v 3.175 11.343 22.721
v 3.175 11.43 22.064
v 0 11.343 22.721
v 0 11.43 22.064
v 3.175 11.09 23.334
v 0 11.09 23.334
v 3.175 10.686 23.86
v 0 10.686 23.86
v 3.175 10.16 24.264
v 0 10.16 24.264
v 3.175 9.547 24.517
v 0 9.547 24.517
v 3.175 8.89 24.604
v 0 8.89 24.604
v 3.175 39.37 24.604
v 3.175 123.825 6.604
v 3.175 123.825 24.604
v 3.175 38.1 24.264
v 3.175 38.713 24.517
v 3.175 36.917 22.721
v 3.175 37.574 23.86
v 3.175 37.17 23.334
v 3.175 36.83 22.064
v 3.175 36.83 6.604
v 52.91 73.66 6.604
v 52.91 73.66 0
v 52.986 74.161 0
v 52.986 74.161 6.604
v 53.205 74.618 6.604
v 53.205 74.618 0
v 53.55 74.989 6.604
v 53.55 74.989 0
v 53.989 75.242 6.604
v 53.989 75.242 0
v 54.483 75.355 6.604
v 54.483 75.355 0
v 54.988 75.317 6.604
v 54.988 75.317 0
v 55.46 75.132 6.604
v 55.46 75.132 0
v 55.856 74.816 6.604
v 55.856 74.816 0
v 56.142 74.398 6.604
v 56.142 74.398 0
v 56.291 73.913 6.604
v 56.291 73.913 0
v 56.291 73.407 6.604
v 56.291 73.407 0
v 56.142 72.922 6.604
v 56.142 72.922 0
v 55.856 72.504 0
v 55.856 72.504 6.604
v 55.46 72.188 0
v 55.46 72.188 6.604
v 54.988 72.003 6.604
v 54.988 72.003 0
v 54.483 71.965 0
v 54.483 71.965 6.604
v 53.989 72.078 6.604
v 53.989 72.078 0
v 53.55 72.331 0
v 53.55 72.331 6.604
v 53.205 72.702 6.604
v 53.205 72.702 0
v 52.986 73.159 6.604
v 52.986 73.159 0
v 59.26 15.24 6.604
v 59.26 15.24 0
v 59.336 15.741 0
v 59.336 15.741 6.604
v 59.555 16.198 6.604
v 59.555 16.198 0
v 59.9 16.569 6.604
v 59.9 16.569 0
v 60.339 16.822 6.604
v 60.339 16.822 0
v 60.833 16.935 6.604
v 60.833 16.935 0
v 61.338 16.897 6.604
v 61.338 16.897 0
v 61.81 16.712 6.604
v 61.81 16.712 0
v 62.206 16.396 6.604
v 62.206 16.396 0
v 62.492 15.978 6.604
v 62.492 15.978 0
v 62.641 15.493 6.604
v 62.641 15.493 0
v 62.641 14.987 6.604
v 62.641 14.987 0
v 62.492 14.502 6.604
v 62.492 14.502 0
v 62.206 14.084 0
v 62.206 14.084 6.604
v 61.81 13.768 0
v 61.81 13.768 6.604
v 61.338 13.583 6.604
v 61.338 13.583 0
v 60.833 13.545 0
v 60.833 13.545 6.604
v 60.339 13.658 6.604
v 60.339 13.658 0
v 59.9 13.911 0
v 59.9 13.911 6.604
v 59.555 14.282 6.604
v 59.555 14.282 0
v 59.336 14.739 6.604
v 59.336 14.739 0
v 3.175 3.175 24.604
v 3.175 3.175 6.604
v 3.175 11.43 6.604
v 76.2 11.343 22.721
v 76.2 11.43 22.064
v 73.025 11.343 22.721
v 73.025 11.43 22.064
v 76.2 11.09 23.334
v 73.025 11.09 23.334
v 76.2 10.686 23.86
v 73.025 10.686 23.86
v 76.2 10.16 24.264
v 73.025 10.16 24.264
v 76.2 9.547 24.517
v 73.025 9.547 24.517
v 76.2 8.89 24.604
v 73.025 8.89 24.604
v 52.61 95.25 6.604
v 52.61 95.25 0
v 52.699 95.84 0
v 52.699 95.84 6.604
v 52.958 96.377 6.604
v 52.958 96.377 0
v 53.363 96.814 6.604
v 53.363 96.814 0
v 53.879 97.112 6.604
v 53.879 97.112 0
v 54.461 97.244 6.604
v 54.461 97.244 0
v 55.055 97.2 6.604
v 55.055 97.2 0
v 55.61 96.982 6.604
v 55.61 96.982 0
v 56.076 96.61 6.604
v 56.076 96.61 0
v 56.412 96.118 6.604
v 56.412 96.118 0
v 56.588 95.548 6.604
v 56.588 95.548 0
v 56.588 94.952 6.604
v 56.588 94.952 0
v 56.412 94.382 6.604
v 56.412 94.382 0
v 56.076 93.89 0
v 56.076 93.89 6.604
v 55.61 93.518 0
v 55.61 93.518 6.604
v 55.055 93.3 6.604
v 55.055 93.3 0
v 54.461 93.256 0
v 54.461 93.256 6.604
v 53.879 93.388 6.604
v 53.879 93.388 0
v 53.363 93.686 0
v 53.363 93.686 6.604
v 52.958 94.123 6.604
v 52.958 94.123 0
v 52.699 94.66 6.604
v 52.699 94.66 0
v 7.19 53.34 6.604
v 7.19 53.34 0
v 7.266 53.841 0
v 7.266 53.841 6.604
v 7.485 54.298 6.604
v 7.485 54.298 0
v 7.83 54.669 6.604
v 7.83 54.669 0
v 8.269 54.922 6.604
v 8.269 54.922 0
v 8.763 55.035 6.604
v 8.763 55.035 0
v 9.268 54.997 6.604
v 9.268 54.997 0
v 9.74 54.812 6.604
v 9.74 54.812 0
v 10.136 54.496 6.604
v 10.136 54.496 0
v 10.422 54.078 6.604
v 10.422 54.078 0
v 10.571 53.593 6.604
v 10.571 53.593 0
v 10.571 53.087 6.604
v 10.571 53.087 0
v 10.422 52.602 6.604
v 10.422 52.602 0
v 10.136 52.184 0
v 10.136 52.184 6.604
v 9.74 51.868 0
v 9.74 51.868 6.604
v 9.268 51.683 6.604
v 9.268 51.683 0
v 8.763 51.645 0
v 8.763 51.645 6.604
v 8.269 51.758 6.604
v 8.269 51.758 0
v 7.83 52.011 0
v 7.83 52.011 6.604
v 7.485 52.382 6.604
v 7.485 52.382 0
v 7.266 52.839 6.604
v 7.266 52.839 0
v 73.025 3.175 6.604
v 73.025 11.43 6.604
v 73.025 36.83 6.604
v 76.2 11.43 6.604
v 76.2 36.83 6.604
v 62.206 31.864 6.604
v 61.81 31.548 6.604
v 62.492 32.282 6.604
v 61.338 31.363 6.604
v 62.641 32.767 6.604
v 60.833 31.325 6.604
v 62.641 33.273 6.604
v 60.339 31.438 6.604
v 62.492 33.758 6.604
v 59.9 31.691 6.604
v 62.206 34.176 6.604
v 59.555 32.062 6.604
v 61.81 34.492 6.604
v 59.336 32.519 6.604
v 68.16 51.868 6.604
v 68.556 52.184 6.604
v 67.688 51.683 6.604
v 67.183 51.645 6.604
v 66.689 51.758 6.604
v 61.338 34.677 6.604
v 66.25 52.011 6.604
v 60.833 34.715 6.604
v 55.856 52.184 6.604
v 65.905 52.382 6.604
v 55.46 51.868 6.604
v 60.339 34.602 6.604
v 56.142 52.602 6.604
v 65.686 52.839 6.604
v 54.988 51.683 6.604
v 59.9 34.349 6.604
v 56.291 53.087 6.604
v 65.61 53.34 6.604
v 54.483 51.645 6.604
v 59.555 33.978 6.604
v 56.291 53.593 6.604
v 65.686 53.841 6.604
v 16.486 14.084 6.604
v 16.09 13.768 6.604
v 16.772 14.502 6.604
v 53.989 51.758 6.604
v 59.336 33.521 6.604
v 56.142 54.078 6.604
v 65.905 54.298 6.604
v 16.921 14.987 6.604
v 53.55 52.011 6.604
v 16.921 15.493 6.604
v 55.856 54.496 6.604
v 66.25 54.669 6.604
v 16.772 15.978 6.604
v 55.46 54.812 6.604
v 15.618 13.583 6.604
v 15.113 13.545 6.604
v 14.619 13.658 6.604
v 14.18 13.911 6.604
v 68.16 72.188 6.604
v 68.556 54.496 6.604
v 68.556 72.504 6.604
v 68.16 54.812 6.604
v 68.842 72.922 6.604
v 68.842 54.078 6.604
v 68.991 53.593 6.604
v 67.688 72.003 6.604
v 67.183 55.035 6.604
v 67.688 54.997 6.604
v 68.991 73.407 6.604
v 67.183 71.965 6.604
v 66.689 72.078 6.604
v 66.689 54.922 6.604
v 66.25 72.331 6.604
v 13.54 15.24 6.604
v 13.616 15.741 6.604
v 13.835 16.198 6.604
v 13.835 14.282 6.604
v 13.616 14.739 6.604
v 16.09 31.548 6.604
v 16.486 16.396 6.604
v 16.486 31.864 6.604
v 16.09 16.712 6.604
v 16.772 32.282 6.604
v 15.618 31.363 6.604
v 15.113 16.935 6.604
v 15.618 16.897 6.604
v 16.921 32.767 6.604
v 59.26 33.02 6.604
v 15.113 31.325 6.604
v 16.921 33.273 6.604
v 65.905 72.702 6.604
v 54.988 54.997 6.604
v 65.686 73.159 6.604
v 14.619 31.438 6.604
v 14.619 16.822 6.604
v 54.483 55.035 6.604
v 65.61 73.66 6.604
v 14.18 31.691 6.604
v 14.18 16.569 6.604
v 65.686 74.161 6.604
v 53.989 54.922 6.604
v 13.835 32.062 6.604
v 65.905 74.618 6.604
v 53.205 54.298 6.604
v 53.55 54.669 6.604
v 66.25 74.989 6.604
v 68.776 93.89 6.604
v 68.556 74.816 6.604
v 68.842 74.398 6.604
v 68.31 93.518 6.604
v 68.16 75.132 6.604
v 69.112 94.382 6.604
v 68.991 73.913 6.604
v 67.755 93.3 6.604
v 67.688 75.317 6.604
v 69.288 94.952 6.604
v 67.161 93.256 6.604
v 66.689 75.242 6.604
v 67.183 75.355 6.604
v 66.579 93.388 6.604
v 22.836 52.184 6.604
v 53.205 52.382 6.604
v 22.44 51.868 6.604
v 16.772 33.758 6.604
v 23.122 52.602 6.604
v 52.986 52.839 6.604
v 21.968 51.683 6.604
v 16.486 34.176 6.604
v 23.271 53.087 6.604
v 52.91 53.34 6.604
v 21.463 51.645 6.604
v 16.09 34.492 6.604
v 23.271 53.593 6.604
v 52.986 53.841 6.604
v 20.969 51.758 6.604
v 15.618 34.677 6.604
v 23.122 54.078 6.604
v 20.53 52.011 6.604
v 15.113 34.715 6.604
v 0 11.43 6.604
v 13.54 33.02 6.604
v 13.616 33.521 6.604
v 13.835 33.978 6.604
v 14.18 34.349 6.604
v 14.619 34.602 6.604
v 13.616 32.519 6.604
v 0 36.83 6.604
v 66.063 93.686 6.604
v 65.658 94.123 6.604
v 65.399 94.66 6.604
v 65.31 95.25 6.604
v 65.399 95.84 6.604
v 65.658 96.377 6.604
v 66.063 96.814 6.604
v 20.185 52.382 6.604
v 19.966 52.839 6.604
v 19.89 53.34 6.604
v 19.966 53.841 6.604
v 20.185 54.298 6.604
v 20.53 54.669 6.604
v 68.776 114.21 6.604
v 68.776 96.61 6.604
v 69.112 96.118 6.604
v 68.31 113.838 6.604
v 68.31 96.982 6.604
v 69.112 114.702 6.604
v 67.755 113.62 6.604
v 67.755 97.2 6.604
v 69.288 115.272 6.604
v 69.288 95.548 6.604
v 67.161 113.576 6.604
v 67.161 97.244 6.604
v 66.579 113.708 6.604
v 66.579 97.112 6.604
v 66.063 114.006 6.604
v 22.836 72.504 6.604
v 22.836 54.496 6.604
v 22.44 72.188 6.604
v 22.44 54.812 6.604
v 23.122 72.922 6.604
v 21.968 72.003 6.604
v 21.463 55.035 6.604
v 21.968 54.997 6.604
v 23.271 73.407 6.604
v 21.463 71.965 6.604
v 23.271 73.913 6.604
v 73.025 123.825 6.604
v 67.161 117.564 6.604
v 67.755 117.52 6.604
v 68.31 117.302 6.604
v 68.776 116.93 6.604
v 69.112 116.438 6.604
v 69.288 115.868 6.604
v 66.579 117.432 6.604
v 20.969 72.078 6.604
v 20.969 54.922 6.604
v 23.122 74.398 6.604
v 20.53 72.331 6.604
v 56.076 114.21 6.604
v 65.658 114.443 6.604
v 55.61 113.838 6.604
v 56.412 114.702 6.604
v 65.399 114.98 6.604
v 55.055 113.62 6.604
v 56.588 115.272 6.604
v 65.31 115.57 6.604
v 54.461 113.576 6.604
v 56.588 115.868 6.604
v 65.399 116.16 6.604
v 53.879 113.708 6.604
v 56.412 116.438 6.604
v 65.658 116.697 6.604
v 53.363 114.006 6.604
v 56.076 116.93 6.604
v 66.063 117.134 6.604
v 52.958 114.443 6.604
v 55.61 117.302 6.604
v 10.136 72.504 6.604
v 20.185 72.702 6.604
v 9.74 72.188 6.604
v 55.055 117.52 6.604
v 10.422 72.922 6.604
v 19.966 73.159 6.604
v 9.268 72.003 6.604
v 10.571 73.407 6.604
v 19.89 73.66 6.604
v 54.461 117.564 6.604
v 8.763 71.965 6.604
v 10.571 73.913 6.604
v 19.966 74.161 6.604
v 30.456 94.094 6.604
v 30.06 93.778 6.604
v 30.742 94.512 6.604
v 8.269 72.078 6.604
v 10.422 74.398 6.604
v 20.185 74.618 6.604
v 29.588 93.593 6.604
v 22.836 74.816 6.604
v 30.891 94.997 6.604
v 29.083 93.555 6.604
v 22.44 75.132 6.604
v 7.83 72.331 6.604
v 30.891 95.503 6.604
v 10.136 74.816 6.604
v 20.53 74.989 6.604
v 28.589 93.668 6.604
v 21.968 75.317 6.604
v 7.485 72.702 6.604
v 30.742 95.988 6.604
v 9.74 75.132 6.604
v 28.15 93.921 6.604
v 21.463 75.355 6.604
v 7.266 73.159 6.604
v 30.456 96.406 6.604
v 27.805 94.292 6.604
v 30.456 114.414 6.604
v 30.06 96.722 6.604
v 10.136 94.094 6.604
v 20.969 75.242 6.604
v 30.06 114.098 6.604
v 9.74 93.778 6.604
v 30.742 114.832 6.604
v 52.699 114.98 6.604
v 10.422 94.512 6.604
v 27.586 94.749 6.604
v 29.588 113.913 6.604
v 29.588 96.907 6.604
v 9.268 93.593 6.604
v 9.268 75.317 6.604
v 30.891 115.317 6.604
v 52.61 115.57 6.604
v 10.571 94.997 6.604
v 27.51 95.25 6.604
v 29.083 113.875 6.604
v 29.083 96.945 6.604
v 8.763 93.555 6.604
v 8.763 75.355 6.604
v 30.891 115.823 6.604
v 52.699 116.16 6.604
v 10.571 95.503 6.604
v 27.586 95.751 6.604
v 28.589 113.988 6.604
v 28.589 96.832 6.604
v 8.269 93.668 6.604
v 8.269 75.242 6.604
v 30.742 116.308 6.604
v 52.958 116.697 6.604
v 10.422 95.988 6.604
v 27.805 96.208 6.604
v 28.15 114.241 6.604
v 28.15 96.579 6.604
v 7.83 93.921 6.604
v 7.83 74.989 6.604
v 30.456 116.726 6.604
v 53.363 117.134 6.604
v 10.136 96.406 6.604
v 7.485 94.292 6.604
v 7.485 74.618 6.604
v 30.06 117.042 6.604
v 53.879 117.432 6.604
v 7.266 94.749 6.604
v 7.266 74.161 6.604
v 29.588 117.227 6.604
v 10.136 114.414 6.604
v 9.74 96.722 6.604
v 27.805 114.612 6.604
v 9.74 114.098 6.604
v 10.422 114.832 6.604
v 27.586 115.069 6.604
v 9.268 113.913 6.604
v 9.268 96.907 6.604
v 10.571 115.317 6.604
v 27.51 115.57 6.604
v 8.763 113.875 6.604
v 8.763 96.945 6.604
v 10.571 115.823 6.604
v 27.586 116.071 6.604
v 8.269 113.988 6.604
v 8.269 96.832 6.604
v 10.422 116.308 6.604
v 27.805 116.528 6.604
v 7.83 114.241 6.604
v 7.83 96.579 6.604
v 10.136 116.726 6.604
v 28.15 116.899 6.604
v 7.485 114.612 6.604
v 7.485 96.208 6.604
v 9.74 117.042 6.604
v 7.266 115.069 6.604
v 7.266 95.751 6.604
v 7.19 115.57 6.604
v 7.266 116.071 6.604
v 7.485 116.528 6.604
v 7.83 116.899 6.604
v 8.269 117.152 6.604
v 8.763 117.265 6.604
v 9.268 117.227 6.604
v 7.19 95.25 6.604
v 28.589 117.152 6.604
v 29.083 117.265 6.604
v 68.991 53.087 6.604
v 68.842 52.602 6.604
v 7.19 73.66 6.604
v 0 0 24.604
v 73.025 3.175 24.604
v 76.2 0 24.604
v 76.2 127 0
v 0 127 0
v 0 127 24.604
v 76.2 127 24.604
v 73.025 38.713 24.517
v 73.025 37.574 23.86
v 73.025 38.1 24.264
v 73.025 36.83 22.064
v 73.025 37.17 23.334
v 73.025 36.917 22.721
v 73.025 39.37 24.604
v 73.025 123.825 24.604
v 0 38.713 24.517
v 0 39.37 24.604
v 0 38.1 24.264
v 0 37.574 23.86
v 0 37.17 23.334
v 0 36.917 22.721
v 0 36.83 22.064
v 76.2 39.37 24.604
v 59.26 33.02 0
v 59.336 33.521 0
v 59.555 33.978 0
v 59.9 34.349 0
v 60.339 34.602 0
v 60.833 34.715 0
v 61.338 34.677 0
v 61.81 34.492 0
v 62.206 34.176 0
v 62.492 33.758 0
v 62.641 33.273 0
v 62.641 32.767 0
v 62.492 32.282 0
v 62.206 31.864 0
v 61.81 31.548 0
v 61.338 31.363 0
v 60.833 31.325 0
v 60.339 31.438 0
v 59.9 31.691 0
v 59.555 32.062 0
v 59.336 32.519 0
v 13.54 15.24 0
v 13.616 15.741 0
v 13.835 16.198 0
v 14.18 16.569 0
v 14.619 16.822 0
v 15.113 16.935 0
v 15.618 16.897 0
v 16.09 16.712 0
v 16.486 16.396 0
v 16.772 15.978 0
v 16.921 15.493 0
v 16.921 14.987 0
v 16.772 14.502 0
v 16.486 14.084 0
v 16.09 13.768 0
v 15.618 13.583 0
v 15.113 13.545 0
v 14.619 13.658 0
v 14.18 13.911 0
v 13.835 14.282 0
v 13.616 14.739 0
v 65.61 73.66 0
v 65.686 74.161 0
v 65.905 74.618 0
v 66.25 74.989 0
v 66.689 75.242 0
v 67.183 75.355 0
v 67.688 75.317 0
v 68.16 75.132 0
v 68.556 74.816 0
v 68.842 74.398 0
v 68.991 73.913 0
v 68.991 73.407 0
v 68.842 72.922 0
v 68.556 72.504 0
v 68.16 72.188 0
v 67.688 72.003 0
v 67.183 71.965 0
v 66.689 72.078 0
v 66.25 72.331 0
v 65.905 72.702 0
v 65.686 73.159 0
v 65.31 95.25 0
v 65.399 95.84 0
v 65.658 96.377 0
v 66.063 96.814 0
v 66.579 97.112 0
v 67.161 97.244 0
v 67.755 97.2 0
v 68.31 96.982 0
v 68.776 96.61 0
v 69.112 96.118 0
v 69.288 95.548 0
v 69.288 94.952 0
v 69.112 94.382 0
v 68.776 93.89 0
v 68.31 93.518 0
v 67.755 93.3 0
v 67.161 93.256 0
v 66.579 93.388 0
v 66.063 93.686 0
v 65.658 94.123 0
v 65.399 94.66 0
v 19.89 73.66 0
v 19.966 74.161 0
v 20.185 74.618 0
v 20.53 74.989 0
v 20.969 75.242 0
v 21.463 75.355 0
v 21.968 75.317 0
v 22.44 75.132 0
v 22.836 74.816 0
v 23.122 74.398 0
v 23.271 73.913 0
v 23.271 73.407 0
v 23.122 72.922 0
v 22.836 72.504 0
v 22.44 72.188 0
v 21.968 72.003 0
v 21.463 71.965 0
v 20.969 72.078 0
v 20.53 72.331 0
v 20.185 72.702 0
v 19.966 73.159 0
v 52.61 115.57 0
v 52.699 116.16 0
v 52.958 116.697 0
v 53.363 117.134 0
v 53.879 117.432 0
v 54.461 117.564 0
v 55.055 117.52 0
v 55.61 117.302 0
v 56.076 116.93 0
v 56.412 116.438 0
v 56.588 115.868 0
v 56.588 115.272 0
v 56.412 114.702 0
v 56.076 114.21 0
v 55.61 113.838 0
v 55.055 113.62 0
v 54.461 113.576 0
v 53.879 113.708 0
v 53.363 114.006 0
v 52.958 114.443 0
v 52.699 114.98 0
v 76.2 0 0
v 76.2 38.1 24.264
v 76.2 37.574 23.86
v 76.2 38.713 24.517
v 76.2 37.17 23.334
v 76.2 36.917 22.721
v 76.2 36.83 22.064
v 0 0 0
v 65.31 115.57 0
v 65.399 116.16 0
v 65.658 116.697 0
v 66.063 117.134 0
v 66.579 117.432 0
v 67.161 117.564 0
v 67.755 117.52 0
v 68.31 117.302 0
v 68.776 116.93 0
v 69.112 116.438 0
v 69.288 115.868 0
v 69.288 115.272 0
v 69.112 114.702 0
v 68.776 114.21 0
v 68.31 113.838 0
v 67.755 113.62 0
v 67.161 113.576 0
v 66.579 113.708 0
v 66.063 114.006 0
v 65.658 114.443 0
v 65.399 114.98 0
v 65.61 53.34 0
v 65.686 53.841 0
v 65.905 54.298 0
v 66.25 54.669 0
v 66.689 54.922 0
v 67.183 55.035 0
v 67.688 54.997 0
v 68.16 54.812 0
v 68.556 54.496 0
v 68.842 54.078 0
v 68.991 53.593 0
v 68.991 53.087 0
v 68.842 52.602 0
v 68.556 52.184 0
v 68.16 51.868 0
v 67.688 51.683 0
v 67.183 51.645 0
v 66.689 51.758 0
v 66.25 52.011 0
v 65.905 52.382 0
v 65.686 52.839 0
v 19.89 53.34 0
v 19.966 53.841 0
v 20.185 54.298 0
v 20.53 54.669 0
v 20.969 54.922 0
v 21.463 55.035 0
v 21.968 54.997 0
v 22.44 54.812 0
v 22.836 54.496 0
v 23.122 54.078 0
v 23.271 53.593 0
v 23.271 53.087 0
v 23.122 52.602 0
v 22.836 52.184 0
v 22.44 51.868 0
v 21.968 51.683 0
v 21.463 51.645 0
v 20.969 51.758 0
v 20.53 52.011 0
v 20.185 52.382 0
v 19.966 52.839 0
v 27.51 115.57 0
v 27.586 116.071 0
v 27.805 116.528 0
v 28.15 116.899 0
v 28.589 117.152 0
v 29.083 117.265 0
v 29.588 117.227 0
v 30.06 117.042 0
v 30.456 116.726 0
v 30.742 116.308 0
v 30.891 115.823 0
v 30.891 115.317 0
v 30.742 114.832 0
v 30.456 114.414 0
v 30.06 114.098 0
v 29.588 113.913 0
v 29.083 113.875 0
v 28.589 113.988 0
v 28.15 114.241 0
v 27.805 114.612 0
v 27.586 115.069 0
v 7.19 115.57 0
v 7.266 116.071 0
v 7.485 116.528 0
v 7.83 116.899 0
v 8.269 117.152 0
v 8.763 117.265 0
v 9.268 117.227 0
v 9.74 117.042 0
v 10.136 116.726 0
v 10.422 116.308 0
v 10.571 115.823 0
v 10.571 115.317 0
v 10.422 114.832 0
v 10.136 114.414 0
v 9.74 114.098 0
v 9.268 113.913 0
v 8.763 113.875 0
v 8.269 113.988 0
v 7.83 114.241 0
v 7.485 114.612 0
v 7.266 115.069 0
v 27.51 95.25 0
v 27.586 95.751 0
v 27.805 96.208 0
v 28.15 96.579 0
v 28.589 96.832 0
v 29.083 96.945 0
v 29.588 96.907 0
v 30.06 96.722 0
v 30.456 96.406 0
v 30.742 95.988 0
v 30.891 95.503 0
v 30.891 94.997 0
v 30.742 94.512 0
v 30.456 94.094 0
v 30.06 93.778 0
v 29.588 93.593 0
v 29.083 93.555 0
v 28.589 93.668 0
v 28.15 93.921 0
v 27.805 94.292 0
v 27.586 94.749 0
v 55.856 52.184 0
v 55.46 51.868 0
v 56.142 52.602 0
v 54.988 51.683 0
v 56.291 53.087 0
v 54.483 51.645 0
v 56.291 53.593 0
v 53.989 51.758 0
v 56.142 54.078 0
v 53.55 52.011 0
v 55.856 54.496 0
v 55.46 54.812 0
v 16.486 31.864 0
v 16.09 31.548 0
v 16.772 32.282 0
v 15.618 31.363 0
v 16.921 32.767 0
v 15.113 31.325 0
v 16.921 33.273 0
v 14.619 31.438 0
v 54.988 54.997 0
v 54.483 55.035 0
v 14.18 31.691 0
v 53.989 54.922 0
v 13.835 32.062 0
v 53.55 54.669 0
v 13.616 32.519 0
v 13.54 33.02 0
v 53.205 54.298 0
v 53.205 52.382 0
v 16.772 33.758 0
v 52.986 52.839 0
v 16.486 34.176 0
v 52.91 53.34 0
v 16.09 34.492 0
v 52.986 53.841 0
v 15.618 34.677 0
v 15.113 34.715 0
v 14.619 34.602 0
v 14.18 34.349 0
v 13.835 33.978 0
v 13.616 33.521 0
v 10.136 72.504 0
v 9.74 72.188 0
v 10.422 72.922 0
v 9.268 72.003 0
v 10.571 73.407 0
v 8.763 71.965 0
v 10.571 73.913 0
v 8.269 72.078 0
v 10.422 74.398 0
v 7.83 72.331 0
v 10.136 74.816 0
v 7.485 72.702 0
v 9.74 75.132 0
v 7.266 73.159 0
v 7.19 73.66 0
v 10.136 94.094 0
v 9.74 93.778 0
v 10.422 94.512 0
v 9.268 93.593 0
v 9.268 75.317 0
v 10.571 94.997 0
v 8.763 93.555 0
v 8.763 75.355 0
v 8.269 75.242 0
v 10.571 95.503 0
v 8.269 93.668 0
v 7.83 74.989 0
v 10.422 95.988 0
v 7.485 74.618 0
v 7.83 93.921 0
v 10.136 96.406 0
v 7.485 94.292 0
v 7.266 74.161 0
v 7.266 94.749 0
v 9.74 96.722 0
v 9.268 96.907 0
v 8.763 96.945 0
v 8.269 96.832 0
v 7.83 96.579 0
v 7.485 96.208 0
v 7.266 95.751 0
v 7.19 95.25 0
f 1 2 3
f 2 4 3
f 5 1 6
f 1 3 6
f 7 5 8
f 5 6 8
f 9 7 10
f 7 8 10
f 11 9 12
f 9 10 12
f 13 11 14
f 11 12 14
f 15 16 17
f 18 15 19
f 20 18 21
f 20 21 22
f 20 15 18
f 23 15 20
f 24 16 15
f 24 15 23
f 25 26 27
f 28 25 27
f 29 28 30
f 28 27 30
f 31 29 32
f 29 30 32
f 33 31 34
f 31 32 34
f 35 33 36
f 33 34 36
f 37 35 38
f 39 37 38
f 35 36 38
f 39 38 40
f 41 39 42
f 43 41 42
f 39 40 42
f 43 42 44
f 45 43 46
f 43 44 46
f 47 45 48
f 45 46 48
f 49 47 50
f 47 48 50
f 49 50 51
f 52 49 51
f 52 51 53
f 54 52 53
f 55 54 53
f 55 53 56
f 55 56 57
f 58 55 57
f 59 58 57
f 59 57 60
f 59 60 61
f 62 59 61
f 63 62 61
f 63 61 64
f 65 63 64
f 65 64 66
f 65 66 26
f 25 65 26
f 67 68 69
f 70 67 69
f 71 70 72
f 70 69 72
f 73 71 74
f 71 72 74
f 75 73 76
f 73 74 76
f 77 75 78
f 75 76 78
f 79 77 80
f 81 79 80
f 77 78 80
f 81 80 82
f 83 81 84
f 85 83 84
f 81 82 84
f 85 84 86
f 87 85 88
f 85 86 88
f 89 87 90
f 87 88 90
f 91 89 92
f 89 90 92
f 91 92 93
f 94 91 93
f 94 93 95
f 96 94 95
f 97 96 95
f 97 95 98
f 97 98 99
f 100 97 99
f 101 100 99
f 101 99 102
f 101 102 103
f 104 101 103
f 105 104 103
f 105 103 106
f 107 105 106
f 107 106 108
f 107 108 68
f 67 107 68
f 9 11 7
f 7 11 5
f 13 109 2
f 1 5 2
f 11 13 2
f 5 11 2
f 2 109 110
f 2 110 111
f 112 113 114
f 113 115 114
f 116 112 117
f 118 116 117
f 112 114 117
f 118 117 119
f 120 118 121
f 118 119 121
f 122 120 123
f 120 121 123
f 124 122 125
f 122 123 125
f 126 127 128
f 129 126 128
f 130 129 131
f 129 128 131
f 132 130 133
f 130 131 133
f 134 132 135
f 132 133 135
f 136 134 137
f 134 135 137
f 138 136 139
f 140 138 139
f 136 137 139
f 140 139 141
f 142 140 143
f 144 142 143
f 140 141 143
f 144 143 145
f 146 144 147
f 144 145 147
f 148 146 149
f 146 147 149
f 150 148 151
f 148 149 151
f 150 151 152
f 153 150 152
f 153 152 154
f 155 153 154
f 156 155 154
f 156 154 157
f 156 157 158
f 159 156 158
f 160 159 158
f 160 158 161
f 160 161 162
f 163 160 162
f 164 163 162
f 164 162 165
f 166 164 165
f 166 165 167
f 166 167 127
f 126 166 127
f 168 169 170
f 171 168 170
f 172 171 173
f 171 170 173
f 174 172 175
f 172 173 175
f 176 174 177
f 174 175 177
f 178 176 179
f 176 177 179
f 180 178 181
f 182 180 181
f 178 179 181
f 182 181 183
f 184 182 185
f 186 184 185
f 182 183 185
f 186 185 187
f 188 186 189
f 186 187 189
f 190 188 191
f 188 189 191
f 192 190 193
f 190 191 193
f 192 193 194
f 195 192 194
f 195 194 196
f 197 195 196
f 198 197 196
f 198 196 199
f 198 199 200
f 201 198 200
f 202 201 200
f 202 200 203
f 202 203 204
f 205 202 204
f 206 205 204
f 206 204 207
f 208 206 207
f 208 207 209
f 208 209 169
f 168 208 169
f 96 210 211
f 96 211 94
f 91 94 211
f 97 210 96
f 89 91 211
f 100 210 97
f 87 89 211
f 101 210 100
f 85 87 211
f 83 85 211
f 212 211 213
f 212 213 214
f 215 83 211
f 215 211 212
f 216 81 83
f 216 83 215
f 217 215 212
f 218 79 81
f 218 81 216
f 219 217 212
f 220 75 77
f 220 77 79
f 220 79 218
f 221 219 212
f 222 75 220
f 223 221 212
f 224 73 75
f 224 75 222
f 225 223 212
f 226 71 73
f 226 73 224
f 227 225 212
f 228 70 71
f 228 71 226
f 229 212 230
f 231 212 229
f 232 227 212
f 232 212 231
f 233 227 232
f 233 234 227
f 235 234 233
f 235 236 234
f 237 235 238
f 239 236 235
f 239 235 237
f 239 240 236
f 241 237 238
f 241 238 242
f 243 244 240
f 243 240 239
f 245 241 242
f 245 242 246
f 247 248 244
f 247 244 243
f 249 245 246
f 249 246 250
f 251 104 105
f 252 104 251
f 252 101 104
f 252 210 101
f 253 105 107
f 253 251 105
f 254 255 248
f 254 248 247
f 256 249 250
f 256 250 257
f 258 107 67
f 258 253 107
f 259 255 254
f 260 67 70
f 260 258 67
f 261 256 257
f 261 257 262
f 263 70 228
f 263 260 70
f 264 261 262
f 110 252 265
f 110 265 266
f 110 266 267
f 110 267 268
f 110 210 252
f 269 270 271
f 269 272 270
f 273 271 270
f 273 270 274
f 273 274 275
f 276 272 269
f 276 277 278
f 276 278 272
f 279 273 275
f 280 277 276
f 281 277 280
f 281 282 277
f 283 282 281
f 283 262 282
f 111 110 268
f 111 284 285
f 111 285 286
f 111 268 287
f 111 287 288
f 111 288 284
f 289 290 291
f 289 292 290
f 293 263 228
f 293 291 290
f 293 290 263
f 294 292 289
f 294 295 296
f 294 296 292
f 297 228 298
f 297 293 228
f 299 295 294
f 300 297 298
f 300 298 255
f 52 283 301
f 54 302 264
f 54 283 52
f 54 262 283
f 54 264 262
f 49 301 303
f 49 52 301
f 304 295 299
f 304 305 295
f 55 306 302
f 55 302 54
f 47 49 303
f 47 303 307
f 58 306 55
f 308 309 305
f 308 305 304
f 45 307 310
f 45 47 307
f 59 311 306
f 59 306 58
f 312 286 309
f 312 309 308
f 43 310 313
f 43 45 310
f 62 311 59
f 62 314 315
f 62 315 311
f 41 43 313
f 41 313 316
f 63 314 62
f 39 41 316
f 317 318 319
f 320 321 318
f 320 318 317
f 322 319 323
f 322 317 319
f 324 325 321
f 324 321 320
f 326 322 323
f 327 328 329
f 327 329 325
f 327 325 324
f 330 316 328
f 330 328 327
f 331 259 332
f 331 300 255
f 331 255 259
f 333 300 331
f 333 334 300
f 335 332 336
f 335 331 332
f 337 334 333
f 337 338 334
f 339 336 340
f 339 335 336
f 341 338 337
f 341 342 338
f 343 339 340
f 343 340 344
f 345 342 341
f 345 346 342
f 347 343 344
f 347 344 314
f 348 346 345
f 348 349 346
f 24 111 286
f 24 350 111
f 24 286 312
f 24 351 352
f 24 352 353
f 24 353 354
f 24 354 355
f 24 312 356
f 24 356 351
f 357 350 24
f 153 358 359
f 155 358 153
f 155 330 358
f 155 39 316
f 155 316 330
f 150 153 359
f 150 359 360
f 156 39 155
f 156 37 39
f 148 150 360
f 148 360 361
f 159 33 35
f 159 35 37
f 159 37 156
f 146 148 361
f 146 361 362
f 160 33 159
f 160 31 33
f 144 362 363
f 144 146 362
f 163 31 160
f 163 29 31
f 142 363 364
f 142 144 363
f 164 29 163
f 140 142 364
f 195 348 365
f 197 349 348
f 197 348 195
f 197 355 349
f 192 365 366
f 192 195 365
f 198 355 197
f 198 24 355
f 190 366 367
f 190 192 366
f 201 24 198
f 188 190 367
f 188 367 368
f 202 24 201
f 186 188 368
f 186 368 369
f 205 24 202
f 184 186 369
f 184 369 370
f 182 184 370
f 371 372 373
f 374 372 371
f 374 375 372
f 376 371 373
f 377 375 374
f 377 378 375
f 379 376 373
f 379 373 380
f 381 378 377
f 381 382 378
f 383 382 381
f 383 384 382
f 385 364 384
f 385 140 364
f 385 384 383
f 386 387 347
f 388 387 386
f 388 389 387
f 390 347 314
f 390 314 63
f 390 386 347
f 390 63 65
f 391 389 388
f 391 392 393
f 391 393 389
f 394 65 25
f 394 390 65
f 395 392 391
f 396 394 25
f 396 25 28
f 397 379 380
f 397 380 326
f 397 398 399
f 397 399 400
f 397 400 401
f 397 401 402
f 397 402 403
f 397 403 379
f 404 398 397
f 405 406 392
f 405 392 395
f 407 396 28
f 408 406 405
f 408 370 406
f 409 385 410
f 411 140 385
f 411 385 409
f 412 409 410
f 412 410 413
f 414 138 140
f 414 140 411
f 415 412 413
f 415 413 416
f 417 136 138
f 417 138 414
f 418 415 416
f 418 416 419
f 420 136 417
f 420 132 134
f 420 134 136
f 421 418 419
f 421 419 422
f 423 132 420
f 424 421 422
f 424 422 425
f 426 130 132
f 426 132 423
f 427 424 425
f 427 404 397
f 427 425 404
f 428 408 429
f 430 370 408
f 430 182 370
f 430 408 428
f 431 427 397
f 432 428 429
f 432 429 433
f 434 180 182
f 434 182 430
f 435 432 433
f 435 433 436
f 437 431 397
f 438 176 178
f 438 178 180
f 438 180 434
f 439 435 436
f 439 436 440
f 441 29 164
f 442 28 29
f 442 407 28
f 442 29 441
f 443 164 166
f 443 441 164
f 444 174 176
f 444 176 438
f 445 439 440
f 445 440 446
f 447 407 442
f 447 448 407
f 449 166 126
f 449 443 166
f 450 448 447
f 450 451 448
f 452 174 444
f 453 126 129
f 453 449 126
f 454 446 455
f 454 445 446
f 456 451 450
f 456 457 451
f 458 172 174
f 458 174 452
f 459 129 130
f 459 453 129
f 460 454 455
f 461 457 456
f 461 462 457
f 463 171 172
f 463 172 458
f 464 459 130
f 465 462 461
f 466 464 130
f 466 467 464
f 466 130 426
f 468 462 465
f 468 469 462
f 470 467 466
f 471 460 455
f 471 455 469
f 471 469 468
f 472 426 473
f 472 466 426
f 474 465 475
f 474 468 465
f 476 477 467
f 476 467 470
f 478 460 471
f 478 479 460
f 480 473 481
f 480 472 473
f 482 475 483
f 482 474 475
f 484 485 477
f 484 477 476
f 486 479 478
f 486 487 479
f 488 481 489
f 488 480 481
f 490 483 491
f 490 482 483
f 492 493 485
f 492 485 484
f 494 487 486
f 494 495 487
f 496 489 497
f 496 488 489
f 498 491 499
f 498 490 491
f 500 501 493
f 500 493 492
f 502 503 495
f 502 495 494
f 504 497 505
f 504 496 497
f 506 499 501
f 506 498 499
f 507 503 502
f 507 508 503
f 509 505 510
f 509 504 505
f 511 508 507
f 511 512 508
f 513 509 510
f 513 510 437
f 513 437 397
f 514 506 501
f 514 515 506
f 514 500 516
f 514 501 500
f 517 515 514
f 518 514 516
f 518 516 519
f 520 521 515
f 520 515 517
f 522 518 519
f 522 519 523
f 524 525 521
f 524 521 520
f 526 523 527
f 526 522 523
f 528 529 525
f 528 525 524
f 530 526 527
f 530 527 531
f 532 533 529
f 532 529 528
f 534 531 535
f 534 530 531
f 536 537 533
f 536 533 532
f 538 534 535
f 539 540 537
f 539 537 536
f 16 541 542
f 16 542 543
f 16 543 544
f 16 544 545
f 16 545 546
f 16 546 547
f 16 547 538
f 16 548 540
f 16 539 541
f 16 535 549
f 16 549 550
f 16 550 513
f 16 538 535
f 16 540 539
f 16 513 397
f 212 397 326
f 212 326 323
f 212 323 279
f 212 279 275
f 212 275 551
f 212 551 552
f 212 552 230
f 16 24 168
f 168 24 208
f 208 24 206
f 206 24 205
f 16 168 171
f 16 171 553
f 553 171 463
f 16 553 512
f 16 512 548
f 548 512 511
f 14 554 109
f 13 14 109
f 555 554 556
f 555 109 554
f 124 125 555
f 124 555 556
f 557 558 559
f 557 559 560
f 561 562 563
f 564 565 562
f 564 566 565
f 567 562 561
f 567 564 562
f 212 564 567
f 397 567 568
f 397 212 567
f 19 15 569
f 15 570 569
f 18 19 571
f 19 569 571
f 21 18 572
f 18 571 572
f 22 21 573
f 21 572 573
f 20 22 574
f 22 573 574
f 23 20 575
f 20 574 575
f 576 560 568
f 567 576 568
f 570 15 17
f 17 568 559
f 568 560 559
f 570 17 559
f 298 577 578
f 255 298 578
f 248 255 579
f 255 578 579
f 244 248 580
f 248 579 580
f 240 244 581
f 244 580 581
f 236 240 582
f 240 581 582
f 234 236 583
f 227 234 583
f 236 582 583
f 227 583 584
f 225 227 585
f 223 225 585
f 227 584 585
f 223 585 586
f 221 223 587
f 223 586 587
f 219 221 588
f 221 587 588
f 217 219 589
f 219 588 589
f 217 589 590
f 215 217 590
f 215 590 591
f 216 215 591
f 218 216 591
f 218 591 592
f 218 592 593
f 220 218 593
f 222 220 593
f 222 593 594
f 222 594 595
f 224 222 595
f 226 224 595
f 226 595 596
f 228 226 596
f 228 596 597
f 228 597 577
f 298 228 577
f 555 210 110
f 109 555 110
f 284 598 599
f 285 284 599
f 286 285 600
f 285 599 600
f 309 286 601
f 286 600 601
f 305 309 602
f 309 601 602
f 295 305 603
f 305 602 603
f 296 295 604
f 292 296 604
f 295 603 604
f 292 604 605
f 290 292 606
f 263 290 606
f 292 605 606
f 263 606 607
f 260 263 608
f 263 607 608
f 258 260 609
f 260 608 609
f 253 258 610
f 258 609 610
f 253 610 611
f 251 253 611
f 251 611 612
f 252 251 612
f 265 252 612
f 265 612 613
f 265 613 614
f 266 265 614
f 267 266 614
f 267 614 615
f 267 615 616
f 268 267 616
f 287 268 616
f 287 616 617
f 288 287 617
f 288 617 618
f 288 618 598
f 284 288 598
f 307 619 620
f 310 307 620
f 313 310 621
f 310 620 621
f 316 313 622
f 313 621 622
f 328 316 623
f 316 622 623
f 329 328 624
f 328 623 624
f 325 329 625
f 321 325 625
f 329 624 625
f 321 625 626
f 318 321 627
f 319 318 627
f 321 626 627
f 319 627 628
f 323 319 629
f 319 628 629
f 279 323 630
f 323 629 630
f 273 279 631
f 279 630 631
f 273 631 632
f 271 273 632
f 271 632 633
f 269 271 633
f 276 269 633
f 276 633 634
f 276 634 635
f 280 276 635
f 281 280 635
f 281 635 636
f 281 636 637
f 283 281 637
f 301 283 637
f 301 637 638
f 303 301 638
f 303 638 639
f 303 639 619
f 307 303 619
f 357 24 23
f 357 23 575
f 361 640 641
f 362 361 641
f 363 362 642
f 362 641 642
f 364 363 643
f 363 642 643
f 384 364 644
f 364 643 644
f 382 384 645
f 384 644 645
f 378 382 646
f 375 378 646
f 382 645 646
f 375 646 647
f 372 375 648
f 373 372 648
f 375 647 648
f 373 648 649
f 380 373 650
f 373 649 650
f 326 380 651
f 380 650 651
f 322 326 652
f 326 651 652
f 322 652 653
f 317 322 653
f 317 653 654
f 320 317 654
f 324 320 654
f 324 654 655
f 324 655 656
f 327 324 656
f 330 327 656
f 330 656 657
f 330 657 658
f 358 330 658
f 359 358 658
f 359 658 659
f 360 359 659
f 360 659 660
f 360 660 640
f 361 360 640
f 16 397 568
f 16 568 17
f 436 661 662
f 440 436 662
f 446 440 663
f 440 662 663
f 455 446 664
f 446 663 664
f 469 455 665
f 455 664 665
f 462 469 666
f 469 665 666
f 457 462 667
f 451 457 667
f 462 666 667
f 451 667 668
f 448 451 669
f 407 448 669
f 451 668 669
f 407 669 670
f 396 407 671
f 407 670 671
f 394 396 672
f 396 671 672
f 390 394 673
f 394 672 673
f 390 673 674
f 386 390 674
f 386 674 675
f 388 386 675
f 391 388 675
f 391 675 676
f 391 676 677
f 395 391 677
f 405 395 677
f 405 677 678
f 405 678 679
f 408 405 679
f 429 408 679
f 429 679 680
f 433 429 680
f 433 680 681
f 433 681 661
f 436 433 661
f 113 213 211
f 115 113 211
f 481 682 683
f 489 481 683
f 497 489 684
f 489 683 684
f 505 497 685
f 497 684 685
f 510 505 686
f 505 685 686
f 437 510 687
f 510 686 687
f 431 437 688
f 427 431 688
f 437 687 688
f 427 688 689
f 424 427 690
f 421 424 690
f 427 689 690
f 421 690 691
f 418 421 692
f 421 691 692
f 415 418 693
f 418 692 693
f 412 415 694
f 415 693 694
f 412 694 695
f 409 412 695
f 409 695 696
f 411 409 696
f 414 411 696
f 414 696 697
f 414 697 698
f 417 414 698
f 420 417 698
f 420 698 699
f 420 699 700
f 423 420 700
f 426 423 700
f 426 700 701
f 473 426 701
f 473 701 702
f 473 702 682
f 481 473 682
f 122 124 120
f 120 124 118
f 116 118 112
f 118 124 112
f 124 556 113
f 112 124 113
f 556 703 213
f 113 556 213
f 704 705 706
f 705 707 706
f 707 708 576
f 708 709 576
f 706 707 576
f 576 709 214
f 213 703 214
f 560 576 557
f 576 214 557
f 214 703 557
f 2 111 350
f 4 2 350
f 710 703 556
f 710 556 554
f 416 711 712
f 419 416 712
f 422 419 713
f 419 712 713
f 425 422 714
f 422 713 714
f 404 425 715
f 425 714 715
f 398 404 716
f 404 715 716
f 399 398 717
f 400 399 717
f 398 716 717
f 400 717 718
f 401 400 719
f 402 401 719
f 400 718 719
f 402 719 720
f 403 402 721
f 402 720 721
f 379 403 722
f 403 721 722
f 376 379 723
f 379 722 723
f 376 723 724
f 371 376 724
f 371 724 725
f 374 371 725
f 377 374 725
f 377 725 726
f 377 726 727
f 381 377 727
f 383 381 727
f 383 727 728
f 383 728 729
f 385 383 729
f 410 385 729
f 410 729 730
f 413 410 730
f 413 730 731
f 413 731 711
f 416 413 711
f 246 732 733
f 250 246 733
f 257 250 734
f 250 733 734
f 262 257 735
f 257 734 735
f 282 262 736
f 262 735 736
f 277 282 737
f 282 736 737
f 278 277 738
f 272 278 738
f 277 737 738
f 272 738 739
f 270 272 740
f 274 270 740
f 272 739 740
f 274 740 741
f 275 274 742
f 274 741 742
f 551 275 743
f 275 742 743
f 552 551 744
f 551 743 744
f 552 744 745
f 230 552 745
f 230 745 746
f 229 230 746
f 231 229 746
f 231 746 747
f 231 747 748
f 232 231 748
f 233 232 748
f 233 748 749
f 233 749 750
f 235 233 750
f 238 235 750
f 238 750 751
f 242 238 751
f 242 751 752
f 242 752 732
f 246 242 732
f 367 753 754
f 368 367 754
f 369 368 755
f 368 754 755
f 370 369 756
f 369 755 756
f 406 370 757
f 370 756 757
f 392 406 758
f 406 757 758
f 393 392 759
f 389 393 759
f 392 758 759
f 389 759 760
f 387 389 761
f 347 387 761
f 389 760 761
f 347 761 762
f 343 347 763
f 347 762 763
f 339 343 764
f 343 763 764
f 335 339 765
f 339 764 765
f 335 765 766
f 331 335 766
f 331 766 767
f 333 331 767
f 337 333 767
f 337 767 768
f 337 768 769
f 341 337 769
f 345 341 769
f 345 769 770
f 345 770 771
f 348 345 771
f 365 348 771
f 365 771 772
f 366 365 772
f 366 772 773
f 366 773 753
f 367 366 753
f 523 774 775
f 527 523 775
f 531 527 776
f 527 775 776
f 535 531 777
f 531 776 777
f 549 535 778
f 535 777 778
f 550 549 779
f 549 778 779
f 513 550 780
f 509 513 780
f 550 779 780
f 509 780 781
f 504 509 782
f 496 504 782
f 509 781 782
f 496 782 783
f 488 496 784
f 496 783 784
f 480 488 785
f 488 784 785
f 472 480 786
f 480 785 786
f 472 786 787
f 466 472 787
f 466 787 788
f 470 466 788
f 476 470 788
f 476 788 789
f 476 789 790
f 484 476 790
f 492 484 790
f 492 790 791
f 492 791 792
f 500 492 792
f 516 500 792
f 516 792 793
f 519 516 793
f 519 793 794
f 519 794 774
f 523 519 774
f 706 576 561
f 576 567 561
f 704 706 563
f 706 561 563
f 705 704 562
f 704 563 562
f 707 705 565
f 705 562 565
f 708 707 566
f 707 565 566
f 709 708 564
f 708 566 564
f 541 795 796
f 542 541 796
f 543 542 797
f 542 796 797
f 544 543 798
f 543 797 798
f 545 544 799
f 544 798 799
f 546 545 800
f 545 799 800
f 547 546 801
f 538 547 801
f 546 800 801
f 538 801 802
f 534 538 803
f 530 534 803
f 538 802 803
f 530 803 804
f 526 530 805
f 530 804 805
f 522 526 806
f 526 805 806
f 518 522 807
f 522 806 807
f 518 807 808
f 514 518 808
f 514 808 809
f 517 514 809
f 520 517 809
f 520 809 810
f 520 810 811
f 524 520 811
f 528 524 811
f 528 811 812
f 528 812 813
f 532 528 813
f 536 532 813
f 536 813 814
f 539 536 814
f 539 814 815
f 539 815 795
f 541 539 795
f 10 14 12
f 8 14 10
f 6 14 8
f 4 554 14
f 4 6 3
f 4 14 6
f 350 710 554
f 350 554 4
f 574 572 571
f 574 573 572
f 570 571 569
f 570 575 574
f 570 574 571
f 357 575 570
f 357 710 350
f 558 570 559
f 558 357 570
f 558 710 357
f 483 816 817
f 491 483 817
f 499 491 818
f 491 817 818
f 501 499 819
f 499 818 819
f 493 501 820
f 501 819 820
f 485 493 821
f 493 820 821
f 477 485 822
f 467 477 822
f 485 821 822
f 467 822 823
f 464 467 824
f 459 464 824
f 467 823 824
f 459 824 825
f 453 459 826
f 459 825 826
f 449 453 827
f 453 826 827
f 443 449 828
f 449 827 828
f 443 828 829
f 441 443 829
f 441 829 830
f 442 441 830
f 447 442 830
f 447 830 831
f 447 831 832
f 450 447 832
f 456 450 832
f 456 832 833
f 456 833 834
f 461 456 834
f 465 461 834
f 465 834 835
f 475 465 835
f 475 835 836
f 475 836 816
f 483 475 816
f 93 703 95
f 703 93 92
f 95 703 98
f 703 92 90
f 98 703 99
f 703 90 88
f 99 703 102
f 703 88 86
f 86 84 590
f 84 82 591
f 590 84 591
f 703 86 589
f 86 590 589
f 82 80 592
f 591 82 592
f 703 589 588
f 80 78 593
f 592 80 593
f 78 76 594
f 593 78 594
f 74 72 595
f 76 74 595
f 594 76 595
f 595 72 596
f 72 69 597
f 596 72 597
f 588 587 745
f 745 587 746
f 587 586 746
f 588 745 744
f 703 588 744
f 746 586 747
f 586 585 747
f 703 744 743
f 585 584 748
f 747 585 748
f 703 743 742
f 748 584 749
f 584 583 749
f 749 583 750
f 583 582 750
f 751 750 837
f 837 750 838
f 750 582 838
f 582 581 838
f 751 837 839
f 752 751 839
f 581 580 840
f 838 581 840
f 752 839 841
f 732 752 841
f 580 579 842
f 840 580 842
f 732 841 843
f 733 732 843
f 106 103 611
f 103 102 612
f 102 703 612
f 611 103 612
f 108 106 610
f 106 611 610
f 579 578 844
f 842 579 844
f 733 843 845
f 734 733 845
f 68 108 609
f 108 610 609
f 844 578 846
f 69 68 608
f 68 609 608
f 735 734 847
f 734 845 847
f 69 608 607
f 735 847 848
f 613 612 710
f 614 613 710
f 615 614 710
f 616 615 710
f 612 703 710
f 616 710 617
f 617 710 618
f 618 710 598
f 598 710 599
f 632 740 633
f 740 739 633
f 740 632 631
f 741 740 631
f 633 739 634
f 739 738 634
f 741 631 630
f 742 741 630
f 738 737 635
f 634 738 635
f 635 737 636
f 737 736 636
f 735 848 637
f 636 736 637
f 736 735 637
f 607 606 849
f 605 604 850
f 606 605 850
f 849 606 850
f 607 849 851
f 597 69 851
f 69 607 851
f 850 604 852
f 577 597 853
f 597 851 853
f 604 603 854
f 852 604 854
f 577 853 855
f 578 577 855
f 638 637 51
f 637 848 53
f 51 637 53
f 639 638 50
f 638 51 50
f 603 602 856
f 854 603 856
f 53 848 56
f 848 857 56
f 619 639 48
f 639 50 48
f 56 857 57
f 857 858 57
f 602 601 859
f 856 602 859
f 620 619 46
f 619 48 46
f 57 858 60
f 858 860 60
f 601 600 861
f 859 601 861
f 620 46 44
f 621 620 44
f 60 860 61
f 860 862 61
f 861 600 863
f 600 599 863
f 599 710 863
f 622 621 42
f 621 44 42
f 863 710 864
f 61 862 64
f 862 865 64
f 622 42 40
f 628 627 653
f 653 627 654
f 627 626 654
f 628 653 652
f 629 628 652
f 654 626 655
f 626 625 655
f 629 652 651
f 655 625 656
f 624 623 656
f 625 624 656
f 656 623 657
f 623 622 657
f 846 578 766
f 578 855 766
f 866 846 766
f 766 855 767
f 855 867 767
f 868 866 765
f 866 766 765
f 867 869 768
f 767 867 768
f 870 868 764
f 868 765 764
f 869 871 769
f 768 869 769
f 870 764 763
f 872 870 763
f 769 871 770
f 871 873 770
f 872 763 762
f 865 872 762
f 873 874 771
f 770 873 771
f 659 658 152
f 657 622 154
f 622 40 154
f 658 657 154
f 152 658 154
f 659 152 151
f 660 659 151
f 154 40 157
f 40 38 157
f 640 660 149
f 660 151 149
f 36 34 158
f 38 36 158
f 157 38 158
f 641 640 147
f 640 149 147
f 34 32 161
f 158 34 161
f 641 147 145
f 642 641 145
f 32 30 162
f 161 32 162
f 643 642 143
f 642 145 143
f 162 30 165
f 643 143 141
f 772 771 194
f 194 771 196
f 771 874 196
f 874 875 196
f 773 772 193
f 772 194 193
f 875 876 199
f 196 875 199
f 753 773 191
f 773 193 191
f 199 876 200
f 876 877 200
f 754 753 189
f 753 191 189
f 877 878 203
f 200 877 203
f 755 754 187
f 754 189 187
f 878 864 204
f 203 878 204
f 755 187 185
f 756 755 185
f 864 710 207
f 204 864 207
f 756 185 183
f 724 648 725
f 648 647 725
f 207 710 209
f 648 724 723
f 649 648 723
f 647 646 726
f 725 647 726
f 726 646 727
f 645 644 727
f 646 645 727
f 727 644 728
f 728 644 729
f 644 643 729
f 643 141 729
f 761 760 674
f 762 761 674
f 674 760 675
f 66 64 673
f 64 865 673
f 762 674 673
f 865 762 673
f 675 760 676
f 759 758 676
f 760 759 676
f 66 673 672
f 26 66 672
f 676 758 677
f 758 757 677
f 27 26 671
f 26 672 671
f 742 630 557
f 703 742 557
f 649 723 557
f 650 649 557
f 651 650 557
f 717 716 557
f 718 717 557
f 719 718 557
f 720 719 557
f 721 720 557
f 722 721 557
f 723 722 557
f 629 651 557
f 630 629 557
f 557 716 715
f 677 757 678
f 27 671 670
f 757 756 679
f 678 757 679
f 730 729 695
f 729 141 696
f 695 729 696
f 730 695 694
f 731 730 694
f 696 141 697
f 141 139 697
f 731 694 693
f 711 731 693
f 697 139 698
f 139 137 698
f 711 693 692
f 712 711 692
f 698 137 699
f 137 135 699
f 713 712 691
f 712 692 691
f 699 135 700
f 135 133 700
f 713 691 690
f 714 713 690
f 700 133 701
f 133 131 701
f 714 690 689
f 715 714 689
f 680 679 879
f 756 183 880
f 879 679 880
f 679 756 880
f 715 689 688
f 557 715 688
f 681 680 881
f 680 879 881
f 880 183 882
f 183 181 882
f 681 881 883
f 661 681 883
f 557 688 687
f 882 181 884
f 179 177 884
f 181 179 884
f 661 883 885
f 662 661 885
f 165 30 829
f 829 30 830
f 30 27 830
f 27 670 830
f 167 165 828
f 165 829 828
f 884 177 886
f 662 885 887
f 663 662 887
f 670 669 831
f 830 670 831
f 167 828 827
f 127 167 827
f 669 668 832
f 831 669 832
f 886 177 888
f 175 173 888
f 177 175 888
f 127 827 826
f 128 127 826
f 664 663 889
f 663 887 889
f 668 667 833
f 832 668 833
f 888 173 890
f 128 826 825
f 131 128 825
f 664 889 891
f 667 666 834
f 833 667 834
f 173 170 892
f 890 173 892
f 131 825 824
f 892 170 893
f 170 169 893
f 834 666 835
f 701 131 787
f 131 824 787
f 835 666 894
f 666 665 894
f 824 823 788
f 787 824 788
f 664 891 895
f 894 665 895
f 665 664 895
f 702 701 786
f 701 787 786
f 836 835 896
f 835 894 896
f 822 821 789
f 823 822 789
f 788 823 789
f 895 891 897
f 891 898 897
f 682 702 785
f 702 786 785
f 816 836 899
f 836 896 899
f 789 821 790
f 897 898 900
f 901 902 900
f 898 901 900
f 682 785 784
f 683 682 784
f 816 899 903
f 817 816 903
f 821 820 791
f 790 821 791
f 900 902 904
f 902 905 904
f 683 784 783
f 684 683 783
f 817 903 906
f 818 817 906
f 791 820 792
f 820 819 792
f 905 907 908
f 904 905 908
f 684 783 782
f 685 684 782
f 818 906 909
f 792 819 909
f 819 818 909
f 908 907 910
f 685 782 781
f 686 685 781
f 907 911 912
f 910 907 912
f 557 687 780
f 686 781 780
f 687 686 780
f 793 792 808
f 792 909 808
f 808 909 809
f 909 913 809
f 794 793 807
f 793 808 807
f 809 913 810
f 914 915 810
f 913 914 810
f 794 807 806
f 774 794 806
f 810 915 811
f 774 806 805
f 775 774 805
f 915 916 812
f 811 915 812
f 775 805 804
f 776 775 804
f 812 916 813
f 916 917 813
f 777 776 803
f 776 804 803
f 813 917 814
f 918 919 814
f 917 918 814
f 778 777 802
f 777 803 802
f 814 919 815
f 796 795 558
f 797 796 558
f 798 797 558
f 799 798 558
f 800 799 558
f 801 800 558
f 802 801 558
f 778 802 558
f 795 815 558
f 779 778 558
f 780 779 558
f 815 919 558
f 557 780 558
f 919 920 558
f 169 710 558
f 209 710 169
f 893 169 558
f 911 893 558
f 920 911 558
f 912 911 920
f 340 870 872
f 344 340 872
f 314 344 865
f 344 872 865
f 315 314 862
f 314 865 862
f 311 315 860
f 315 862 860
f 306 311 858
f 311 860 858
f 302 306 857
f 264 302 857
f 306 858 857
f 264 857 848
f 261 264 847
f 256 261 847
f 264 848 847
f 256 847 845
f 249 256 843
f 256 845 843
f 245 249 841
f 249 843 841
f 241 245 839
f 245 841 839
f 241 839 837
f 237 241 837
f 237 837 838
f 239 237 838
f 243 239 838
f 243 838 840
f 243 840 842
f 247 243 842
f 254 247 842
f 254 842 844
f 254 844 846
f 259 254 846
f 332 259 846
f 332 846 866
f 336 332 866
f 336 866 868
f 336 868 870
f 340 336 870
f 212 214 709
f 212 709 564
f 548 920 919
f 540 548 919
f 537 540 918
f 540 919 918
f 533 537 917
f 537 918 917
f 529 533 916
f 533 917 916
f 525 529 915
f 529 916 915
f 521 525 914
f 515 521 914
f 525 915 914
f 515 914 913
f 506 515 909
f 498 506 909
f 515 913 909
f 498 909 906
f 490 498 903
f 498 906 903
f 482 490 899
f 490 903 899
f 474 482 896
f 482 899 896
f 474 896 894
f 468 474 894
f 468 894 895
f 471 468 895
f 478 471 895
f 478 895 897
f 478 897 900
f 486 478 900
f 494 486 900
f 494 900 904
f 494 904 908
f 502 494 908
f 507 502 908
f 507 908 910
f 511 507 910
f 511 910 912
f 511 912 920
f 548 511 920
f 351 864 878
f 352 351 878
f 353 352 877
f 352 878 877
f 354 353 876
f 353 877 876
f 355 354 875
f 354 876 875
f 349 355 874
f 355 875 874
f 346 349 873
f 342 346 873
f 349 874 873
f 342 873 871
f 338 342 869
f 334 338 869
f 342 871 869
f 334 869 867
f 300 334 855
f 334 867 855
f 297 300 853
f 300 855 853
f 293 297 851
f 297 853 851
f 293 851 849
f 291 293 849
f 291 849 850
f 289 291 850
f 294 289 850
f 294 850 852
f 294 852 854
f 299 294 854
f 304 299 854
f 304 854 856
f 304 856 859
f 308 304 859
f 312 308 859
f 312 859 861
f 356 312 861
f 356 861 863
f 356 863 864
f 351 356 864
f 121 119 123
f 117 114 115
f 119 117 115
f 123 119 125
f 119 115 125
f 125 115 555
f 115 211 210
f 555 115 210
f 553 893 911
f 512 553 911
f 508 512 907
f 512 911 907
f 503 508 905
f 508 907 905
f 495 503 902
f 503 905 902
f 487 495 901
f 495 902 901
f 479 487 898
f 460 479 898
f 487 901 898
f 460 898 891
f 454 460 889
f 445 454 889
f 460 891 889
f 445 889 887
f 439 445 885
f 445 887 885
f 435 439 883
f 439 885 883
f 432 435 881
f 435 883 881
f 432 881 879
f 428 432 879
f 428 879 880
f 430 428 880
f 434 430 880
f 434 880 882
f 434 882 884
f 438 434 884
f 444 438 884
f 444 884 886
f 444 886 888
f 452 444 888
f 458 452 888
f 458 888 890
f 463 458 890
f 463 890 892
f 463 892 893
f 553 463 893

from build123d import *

# Parameters (mm, degrees)
SKETCH1_W           = 127
SKETCH1_H           = 76.2
BOSS_EXTRUDE1_DEPTH = 6.604
HOLE2_D             = 3.4
HOLE2_DEPTH         = 7
HOLE3_D             = 4
HOLE3_DEPTH         = 7
BOSS_EXTRUDE2_DEPTH = 18
FILLET1_R           = 2.54


with BuildPart() as part:
    # Sketch1 → Boss-Extrude1 (new body)
    with BuildSketch(Plane(origin=(0, 0, 0), x_dir=(0, 1, 0), z_dir=(0, 0, 1))):
        with Locations((63.5, -38.1)):
            Rectangle(SKETCH1_W, SKETCH1_H)
    extrude(amount=BOSS_EXTRUDE1_DEPTH)

    # Hole2
    with Locations(Plane.XY.offset(6.604)):
        with Locations((54.61, 73.66), (15.24, 15.24), (60.96, 15.24), (60.96, 33.02), (15.24, 33.02), (8.89, 53.34), (21.59, 53.34), (21.59, 73.66), (8.89, 73.66), (8.89, 95.25), (29.21, 95.25), (29.21, 115.57), (8.89, 115.57), (54.61, 53.34), (67.31, 53.34), (67.31, 73.66)):
            Hole(HOLE2_D / 2, depth=HOLE2_DEPTH)

    # Hole3
    with Locations(Plane.XY.offset(6.604)):
        with Locations((67.31, 115.57), (54.61, 115.57), (54.61, 95.25), (67.31, 95.25)):
            Hole(HOLE3_D / 2, depth=HOLE3_DEPTH)

    # Sketch12 → Boss-Extrude2 (add)
    with BuildSketch(Plane.XY.offset(6.604)):
        Polygon((3.175, 123.825), (3.175, 36.83), (0, 36.83), (0, 127), (76.2, 127), (76.2, 36.83), (73.025, 36.83), (73.025, 123.825), align=None)
        Polygon((0, 0), (76.2, 0), (76.2, 11.43), (73.025, 11.43), (73.025, 3.175), (3.175, 3.175), (3.175, 11.43), (0, 11.43), align=None)
    extrude(amount=BOSS_EXTRUDE2_DEPTH)

    # Fillet1
    fillet1_edges = [part.edges().sort_by_distance(p)[0] for p in [
        (1.5875, 36.83, 24.604),
        (74.6125, 36.83, 24.604),
        (74.6125, 11.43, 24.604),
        (1.5875, 11.43, 24.604),
    ]]
    fillet(fillet1_edges, radius=FILLET1_R)


solid = part.part
